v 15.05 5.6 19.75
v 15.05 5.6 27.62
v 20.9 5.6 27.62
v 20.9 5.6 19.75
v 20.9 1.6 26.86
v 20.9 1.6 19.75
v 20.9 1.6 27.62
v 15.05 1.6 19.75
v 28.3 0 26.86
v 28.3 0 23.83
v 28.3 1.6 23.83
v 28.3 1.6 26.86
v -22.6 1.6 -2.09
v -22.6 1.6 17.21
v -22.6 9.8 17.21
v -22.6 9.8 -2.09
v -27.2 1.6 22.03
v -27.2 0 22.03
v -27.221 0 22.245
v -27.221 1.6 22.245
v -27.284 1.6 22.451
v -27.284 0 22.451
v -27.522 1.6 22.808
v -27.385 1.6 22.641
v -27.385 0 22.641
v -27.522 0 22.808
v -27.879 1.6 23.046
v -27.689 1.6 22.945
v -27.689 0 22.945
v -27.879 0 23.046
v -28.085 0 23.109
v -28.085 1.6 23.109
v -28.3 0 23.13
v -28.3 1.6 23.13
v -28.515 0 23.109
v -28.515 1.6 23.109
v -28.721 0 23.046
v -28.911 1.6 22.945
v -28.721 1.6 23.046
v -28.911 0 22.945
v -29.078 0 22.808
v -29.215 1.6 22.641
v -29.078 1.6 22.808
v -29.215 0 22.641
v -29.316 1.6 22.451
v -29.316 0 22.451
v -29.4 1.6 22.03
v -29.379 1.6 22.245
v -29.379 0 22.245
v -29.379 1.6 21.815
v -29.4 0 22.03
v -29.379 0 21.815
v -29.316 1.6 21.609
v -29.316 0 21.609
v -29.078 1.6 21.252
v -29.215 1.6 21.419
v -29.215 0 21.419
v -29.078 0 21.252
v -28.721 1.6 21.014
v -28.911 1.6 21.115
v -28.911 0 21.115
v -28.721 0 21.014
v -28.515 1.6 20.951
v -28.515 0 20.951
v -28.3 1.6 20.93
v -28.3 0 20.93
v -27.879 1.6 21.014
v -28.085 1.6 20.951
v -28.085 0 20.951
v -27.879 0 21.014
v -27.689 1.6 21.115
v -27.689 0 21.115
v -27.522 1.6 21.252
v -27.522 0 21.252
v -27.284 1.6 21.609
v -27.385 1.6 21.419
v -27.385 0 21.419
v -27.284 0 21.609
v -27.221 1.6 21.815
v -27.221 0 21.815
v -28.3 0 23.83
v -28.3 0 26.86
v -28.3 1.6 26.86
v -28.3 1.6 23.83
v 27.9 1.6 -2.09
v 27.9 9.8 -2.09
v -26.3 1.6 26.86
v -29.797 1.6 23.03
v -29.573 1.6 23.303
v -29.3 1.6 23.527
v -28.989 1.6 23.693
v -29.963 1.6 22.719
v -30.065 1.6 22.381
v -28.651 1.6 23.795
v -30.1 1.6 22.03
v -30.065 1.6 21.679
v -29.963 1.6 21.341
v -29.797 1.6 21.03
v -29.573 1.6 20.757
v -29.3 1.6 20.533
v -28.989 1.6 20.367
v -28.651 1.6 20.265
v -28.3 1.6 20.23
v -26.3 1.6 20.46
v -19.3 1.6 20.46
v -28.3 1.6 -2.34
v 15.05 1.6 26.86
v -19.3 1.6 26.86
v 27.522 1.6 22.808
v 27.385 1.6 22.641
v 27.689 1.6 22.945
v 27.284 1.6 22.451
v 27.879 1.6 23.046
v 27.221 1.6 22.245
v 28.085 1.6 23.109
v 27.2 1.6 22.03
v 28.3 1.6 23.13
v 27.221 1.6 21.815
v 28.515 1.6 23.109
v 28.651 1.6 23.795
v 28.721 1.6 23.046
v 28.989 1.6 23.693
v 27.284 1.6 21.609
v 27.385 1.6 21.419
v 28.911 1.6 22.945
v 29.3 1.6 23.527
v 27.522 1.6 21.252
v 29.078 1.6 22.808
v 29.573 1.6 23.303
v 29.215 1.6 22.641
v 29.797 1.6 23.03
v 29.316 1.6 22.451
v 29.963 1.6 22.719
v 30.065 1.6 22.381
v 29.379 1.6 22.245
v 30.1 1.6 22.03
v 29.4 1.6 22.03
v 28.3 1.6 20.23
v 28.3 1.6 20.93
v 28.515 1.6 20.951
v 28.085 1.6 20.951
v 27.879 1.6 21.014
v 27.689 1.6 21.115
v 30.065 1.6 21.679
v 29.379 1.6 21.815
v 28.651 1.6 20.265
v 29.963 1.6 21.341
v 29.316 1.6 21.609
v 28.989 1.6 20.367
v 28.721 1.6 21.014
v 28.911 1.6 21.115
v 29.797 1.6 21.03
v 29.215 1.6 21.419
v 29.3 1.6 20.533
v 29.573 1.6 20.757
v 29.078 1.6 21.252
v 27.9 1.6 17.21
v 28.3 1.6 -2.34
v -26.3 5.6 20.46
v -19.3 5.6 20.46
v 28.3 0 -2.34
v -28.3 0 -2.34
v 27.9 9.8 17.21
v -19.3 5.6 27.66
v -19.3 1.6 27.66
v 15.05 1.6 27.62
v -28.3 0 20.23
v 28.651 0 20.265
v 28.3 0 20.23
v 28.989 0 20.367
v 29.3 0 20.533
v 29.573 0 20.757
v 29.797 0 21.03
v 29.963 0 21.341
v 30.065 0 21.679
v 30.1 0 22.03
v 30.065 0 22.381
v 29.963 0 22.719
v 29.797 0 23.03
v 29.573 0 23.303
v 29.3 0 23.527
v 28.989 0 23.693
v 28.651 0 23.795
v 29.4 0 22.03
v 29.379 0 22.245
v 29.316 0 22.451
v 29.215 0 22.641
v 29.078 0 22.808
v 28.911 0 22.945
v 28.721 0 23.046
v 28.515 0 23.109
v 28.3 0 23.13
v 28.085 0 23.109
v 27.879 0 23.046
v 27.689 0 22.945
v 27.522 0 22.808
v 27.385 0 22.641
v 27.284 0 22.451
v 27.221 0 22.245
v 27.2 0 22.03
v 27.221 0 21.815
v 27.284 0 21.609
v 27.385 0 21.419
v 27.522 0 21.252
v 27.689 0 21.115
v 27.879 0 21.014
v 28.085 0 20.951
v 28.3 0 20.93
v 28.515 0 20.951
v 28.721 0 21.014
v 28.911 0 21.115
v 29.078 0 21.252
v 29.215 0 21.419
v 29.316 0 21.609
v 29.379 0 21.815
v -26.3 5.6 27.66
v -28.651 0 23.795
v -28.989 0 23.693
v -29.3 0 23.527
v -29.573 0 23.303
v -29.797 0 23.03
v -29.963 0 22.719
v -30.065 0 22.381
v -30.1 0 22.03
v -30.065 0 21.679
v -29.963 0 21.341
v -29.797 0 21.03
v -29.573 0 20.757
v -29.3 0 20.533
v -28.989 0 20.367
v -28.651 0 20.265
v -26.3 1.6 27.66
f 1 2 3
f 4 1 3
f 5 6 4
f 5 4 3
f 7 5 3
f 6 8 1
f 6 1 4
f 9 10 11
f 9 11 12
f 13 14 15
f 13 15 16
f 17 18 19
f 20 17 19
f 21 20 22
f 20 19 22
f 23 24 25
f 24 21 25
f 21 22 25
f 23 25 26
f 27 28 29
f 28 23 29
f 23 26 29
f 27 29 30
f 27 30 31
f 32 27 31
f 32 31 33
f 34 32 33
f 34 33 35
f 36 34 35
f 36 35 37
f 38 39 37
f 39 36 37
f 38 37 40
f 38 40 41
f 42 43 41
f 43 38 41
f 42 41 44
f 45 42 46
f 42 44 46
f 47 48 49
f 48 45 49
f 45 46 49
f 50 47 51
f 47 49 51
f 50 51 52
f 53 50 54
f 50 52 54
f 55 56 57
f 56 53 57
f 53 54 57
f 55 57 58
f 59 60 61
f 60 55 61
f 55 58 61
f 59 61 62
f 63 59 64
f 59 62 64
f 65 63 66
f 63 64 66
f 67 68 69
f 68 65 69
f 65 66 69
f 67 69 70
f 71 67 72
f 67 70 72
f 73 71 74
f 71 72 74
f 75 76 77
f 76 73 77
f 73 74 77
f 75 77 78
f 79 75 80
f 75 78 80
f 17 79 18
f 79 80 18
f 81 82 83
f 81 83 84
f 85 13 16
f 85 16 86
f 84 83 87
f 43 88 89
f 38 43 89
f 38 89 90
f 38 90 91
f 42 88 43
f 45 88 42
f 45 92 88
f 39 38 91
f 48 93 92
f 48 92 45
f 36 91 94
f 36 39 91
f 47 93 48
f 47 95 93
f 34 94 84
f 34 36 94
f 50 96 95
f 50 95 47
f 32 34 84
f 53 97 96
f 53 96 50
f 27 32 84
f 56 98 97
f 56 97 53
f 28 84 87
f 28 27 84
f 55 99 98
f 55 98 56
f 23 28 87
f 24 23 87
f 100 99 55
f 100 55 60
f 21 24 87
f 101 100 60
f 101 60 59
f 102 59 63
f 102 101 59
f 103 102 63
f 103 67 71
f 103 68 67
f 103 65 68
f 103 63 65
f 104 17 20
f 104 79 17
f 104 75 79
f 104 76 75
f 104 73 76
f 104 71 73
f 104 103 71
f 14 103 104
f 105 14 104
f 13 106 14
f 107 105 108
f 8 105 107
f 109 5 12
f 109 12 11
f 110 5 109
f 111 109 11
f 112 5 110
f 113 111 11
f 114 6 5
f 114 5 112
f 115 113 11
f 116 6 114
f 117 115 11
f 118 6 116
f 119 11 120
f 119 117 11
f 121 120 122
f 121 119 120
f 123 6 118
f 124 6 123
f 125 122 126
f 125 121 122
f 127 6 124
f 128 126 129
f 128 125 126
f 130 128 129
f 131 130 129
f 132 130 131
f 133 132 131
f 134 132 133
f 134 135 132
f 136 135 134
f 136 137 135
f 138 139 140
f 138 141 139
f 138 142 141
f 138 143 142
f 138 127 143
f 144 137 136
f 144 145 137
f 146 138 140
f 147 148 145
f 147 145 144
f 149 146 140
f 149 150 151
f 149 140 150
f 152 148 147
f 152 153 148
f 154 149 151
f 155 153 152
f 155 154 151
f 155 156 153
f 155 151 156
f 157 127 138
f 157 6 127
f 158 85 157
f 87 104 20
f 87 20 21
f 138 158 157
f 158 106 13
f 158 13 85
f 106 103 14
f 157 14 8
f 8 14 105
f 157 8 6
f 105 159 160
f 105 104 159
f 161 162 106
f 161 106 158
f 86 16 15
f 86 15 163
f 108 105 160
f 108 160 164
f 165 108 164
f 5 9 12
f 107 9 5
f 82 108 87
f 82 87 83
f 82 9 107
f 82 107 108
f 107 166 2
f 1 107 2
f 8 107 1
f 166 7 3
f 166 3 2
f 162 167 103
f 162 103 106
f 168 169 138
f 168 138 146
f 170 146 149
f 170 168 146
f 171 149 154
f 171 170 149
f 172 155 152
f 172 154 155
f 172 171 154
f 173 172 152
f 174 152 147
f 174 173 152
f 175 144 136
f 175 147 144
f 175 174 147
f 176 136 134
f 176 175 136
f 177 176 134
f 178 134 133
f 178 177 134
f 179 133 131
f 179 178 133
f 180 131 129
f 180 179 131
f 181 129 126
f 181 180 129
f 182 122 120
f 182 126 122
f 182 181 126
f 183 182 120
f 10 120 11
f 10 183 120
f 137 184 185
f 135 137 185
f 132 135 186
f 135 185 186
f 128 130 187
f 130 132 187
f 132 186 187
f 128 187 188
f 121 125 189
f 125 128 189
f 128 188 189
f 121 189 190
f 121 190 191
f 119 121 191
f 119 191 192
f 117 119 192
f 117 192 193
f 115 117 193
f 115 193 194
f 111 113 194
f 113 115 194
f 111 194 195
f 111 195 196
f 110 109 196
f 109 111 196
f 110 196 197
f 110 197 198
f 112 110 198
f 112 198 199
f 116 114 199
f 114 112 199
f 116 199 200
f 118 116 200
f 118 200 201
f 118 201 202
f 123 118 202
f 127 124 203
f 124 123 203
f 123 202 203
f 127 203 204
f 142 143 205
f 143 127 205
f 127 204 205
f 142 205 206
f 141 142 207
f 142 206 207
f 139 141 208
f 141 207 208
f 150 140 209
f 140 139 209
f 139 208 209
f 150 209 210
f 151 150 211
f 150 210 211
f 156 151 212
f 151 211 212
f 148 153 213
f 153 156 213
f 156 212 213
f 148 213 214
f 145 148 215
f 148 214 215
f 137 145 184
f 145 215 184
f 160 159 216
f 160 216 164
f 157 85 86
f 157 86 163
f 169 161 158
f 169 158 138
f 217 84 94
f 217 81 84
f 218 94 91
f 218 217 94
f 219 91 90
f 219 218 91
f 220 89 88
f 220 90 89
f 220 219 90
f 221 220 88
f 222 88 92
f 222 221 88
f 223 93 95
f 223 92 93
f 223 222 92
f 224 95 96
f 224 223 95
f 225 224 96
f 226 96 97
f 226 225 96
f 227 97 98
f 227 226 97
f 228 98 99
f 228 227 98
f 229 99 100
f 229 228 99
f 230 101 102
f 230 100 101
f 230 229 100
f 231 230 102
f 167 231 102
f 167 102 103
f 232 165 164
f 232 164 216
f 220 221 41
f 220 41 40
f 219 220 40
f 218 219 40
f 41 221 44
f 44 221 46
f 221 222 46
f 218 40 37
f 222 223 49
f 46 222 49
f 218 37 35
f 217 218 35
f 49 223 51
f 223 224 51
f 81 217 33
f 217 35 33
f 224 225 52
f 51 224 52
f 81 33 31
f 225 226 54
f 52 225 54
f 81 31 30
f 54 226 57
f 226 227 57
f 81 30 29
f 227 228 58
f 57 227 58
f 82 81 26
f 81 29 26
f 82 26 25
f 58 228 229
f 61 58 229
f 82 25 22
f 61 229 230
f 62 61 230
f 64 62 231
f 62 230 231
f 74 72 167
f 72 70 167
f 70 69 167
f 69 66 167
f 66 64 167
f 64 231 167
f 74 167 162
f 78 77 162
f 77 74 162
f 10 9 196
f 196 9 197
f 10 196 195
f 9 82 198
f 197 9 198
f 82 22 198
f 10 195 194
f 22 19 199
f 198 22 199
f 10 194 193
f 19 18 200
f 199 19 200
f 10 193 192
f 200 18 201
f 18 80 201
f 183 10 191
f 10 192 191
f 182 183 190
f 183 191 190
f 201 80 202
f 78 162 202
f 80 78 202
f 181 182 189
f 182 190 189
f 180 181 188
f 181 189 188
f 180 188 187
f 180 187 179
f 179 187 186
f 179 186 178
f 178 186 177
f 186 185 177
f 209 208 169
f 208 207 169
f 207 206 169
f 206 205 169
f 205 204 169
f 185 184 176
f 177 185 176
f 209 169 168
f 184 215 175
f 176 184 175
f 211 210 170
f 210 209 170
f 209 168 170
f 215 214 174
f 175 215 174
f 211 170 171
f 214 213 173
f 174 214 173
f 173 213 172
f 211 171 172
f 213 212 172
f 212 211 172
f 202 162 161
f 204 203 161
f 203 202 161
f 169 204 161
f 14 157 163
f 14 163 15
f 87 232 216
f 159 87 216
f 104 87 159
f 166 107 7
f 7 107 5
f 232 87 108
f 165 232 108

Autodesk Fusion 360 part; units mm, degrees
sketch "Skizze1" plane through (0, 0, 0) normal (0, 1, 0) x (1, 0, 0)
  line L0 (-28.3, 2.34) -> (28.3, 2.34)
  line L1 (28.3, -26.86) -> (-28.3, -26.86)
  line L2 (0, -1.75) -> (0, -22.5)
  circle A0 centre (28.3, -22.03) radius 1.1
  circle A1 centre (-28.3, -22.03) radius 1.1
  line L3 (-22.6, 2.09) -> (27.9, 2.09)
  line L4 (27.9, 2.09) -> (27.9, -17.21)
  line L5 (27.9, -17.21) -> (-22.6, -17.21)
  line L6 (-22.6, -17.21) -> (-22.6, 2.09)
  line L7 (-28.3, -20.23) -> (-28.3, 2.34)
  line L8 (28.3, 2.34) -> (28.3, -20.23)
  line L9 (28.3, -23.83) -> (28.3, -26.86)
  arc A2 (28.3, -23.83) -> (28.3, -20.23) centre (28.3, -22.03) ccw
  arc A3 (-28.3, -20.23) -> (-28.3, -23.83) centre (-28.3, -22.03) ccw
  line L10 (-28.3, -26.86) -> (-28.3, -23.83)
  line L11 (-19.3, -27.66) -> (-26.3, -27.66)
  line L12 (-26.3, -27.66) -> (-26.3, -20.46)
  line L13 (-26.3, -20.46) -> (-19.3, -20.46)
  line L14 (-19.3, -20.46) -> (-19.3, -27.66)
  line L15 (15.05, -19.75) -> (20.9, -19.75)
  line L16 (20.9, -19.75) -> (20.9, -27.62)
  line L17 (20.9, -27.62) -> (15.05, -27.62)
  line L18 (15.05, -27.62) -> (15.05, -19.75)
  dimension "d3" = 29.2
  dimension "d4" = 56.6
  dimension "d5" = 4.83
  dimension "d6" = 3.6
  dimension "d7" = 2.2
  dimension "d8" = 5.7
  dimension "d9" = 50.5
  dimension "d10" = 19.3
  dimension "d11" = 0.25
  dimension "d17" = 2
  dimension "d19" = 0.8
  dimension "d20" = 6.4
  dimension "d21" = 7
  dimension "d22" = 7.4
  dimension "d23" = 5.85
  dimension "d24" = 0.76
  dimension "d25" = 7.11
extrude "Extrusion1" add sketch "Skizze1" along normal blind 1.6 contours L0 L1 L7 L8 L9 A2 A3 L10 L12 L13 L14 L15 L16 L18 | L1 L12 L13 L14 | L1 L15 L16 L18 | L3 L4 L5 L6
extrude "Extrusion2" add sketch "Skizze1" along normal blind 8.2 from surface at 1.6 contours L3 L4 L5 L6
extrude "Extrusion3" add sketch "Skizze1" along normal blind 4 from surface at 1.6 contours L1 L12 L13 L14 | L1 L11 L12 L14 | L1 L16 L17 L18 | L1 L15 L16 L18
